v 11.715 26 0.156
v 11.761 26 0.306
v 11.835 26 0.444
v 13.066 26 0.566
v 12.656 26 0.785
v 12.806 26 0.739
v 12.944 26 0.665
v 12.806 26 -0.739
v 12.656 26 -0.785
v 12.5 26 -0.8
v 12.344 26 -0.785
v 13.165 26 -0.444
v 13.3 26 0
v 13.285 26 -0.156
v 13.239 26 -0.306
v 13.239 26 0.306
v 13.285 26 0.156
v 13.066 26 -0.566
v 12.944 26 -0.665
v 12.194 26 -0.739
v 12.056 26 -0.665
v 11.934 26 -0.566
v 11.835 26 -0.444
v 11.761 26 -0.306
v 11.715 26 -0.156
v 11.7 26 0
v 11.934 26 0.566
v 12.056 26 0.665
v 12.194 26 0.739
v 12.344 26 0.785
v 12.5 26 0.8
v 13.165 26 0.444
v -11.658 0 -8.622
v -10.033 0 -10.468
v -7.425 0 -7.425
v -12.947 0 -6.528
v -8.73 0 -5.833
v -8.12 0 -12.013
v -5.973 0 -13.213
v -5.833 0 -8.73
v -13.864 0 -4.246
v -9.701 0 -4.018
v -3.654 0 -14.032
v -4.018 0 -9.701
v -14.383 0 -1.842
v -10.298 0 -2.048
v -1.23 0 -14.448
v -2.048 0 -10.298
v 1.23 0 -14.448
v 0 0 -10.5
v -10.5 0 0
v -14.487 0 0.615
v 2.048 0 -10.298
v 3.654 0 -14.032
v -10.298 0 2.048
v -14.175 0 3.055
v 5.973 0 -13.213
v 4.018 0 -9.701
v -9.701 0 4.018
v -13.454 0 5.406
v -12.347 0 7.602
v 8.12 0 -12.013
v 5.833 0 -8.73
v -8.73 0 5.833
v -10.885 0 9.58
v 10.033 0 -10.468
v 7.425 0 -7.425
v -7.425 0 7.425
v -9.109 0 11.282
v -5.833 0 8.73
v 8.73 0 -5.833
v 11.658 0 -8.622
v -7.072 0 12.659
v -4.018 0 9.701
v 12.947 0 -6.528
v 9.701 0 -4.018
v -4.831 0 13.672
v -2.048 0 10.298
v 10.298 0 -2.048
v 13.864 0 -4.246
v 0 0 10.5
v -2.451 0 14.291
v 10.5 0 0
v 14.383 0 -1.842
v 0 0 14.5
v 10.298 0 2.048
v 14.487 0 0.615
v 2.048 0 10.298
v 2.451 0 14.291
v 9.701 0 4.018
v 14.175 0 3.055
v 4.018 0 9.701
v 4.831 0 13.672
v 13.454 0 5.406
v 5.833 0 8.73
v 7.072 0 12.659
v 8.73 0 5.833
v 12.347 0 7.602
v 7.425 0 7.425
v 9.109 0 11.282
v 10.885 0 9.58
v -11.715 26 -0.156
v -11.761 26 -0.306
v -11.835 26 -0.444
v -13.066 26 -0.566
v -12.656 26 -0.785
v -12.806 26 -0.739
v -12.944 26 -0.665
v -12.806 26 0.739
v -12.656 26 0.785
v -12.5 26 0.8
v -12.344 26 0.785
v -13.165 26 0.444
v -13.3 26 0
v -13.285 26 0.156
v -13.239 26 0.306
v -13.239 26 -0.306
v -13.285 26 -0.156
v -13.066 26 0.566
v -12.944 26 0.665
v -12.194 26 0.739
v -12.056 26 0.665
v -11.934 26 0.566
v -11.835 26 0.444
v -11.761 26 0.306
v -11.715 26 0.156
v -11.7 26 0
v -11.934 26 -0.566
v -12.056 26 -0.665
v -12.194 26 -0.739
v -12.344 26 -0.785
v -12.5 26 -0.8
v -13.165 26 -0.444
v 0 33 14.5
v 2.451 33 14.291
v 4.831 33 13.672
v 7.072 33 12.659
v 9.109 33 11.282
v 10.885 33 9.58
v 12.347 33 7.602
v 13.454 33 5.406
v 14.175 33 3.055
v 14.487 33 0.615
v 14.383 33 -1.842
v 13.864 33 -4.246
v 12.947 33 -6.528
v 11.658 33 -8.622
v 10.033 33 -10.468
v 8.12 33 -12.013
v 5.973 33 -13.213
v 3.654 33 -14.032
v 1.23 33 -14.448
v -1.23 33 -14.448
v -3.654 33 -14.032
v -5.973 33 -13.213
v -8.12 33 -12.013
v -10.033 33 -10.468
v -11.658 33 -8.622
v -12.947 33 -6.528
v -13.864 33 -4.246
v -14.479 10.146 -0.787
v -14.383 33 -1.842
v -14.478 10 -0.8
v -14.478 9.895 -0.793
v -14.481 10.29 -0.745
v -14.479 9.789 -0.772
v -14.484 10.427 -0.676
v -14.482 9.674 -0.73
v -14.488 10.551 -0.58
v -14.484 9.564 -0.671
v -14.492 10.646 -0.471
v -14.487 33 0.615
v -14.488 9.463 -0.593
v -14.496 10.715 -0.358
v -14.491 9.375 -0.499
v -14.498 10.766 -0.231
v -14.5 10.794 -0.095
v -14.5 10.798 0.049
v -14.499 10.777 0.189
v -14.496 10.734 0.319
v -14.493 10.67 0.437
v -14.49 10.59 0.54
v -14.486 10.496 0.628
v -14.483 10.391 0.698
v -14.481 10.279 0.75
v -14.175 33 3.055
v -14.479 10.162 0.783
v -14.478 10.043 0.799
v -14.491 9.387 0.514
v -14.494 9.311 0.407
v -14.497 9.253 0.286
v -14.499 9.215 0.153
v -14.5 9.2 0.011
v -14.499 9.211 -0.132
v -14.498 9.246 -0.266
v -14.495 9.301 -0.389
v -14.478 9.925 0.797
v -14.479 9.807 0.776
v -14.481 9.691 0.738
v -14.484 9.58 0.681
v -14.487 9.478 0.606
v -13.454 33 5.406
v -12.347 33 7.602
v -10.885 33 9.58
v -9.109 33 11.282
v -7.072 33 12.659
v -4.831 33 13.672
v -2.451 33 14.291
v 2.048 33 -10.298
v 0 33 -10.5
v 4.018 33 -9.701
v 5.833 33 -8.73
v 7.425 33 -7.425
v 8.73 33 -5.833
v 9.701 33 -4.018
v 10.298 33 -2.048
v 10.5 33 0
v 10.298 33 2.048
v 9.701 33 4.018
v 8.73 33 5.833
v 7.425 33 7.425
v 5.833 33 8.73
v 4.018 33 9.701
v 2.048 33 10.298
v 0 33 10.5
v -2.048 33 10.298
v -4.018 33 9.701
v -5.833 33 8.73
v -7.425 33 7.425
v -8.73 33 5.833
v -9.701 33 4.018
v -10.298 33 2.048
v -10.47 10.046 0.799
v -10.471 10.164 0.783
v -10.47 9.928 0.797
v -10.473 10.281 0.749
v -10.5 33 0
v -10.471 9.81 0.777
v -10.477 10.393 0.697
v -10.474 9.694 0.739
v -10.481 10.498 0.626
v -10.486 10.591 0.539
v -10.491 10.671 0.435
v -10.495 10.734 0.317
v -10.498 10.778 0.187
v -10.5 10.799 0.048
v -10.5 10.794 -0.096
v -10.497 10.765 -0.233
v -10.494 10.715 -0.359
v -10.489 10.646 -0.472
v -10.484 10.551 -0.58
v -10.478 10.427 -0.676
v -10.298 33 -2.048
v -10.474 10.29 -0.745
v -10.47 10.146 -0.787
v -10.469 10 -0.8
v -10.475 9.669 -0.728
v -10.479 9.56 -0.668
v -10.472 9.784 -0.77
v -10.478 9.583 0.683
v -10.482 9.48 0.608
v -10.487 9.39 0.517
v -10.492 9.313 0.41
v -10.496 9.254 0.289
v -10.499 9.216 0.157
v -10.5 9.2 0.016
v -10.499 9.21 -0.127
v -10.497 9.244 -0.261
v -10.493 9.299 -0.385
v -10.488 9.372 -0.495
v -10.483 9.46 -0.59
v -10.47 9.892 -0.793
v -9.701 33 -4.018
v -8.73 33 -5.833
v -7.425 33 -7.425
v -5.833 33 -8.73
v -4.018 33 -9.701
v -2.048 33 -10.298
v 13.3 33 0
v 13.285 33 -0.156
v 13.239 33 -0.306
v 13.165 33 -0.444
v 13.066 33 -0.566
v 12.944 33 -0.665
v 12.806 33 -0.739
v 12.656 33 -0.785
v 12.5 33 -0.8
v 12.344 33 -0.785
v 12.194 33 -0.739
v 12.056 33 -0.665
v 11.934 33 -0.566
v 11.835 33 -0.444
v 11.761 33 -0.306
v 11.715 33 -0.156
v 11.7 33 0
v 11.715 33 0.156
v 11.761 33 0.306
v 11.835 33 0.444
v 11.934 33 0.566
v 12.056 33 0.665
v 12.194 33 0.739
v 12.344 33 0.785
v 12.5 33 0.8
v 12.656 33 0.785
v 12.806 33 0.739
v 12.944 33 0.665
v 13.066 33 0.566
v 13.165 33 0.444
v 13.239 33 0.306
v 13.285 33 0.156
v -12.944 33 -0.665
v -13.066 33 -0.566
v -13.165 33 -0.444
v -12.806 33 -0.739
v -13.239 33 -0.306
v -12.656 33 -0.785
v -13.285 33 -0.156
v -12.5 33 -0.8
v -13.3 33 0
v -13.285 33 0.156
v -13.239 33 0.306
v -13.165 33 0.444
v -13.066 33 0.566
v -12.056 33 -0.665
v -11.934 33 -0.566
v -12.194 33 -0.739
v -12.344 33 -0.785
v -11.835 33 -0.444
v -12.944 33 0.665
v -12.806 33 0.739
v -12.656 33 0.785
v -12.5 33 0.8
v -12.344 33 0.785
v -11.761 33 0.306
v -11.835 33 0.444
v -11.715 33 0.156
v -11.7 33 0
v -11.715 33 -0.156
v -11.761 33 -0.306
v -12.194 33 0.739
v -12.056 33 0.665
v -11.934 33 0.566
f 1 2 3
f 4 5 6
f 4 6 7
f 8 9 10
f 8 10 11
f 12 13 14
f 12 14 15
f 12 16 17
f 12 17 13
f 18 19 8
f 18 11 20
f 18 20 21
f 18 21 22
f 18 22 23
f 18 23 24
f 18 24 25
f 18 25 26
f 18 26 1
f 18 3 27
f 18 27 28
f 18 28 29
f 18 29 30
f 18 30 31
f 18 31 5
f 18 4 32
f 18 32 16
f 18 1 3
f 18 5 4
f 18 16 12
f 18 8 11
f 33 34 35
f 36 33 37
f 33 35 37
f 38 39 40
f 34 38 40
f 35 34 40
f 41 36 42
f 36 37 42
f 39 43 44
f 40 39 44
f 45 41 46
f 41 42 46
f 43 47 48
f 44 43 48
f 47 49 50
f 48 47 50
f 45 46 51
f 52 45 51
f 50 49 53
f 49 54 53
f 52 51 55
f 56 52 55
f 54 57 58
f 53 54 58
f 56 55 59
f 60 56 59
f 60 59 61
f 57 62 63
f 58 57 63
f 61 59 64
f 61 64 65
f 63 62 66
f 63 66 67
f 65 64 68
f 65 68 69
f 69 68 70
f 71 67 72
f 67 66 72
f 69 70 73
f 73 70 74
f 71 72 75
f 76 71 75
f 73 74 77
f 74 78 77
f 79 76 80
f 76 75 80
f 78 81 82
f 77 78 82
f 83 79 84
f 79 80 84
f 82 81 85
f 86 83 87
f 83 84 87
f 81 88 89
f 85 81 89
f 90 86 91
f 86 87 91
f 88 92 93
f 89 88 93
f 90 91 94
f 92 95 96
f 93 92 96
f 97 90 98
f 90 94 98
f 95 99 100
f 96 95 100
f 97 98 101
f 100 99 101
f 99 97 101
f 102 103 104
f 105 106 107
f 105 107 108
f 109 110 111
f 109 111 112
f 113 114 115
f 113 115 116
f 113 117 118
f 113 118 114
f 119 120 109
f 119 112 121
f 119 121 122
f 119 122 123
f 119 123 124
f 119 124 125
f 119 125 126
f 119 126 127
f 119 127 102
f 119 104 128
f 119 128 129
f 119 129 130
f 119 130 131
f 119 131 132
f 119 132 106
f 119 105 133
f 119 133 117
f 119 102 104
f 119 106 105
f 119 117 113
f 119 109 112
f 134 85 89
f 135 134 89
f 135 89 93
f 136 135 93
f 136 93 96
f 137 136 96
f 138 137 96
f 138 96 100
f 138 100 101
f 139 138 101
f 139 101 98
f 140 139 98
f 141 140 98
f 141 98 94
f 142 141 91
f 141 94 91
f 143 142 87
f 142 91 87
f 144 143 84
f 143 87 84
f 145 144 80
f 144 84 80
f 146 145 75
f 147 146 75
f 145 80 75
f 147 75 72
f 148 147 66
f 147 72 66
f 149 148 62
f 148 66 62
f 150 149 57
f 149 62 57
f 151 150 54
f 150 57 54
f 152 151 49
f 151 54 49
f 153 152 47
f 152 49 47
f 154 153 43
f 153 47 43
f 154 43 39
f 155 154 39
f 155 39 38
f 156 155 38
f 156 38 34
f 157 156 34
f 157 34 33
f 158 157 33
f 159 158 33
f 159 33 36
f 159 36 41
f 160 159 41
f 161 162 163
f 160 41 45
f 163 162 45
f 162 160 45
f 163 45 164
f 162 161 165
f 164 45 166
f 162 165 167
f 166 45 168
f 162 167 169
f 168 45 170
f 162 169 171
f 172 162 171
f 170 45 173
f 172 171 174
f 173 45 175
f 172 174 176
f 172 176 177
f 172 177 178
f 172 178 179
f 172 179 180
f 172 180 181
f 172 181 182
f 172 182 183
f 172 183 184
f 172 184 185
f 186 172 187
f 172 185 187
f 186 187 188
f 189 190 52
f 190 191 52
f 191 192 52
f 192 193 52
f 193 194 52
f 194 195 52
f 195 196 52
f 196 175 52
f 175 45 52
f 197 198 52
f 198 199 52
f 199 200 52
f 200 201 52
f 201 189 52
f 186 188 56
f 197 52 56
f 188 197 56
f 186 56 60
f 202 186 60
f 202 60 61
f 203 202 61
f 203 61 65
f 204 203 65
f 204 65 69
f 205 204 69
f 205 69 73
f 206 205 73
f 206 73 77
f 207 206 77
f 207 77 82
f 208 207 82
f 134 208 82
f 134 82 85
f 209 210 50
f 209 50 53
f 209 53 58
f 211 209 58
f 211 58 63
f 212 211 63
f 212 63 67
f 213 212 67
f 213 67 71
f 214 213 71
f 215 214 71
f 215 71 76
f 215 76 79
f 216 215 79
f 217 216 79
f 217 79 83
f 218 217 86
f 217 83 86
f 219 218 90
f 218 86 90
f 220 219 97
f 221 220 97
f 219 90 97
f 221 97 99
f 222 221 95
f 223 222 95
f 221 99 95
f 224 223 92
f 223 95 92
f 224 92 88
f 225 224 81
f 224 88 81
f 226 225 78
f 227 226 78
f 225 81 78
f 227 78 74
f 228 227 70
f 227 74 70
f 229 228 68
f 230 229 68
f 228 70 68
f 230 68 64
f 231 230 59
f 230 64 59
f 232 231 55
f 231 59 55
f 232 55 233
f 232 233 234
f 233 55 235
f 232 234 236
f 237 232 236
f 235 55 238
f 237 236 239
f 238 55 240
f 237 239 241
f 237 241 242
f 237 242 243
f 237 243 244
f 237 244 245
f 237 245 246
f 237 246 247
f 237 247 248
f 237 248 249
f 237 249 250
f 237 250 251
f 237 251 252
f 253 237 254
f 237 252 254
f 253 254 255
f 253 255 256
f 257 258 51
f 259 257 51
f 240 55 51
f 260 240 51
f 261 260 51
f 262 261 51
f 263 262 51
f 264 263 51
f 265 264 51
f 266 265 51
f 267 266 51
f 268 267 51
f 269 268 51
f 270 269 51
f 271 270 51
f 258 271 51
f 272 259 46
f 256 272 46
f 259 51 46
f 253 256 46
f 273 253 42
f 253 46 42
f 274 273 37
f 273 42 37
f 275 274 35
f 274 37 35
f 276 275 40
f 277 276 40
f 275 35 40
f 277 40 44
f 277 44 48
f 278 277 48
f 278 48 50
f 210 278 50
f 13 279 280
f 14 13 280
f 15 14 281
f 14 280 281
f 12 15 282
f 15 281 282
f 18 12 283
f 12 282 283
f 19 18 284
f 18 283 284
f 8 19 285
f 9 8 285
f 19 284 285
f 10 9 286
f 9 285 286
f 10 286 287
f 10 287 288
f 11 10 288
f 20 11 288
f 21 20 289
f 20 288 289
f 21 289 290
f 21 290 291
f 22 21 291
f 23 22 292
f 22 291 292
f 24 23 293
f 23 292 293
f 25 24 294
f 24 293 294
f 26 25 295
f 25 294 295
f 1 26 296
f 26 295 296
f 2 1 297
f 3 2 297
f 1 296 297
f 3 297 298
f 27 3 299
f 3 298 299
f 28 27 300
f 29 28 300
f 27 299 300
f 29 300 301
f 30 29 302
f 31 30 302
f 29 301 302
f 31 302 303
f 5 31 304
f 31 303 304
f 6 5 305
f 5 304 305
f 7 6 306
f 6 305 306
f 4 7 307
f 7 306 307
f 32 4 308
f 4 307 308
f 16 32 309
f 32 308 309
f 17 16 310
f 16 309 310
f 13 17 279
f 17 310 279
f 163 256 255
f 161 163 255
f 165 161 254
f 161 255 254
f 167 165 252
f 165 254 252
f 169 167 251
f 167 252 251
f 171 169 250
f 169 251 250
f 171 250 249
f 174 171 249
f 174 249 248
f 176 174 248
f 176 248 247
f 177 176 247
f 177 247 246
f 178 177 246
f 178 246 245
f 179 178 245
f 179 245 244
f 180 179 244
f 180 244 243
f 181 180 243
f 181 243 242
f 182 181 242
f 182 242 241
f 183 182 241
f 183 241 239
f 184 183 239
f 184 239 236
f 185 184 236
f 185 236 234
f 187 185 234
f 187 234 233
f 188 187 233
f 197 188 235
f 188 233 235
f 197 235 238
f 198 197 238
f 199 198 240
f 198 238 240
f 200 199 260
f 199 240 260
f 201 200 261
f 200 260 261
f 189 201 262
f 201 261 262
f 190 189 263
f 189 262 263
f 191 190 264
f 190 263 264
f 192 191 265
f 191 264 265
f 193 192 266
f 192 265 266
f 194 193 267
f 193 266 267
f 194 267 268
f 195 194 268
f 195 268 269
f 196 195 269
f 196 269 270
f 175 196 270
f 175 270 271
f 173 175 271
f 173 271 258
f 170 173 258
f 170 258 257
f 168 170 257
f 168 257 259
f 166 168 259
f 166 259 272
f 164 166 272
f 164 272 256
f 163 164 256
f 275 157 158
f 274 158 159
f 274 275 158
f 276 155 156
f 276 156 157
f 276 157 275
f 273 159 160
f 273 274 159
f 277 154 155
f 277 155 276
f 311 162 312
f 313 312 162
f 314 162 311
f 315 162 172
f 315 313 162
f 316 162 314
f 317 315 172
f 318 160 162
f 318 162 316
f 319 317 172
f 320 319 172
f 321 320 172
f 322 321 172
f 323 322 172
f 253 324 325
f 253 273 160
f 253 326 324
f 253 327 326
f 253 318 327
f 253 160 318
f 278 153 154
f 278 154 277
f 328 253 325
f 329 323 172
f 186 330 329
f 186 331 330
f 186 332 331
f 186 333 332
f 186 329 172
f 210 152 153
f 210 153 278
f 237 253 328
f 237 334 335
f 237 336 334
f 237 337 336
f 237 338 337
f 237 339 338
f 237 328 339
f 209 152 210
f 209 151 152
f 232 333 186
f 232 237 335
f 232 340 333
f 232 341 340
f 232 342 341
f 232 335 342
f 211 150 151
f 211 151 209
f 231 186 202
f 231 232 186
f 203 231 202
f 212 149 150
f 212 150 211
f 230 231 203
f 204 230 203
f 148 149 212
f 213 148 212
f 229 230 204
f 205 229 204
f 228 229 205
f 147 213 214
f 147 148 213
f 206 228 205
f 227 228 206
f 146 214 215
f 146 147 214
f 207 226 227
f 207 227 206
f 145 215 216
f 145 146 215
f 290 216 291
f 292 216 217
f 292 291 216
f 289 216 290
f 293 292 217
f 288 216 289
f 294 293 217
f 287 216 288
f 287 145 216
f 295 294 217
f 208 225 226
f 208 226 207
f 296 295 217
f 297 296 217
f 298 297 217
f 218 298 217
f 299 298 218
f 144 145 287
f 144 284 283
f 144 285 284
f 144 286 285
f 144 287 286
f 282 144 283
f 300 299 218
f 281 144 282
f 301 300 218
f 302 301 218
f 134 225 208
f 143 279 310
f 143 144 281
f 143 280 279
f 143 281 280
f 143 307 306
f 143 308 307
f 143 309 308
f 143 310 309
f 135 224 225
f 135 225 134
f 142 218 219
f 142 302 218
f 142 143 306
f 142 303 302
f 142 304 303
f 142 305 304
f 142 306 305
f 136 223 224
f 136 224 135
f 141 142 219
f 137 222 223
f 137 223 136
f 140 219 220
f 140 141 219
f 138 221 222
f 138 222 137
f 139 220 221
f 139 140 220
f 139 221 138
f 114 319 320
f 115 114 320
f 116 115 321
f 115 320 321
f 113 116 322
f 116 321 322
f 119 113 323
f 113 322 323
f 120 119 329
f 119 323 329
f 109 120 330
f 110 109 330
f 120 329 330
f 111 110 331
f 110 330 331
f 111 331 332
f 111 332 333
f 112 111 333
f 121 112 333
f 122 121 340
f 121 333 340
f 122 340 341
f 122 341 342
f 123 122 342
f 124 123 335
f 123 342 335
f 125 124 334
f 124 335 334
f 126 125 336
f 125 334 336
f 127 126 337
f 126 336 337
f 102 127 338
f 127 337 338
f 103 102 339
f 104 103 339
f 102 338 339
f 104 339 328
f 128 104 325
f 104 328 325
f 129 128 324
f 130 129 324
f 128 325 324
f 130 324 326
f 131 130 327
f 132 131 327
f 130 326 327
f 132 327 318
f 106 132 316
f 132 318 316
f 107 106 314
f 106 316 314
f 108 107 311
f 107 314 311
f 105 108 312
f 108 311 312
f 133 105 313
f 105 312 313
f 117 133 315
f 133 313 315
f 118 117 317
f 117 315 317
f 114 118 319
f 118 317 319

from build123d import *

# Parameters (mm, degrees)
SKETCH_1_R          = 13
SKETCH_1_R_2        = 9.172
EXTRUDE_1_DEPTH     = 25
SKETCH_7_R          = 10.172
CUT_EXTRUDE_2_DEPTH = 50
SKETCH_8_R          = 13
SKETCH_8_R_2        = 10.172
EXTRUDE_2_DEPTH     = 8
SKETCH_11_R         = 10.5
CUT_EXTRUDE_4_DEPTH = 50
EXTRUDE_START       = -33
SKETCH_13_R         = 14.5
SKETCH_13_R_2       = 13
EXTRUDE_3_DEPTH     = 33
SKETCH_4_R          = 0.8
CUT_EXTRUDE_1_DEPTH = 30
SKETCH_10_R         = 0.8
CUT_EXTRUDE_5_DEPTH = 7


with BuildPart() as part:
    # Эскиз1 → Бобышка-Вытянуть1 (new body)
    with BuildSketch(Plane(origin=(0, 0, 0), x_dir=(1, 0, 0), z_dir=(0, 1, 0))):
        with Locations(Location((0, 0, 0), (0, 0, 270))):
            Circle(SKETCH_1_R)
        with Locations(Location((0, 0, 0), (0, 0, 270))):
            Circle(SKETCH_1_R_2, mode=Mode.SUBTRACT)
    extrude(amount=EXTRUDE_1_DEPTH)

    # Эскиз7 → Вырез-Вытянуть2 (cut)
    with BuildSketch(Plane.XZ):
        with Locations(Location((0, 0, 0), (0, 0, 270))):
            Circle(SKETCH_7_R)
    extrude(amount=-CUT_EXTRUDE_2_DEPTH, mode=Mode.SUBTRACT)

    # Эскиз8 → Бобышка-Вытянуть2 (add)
    with BuildSketch(Plane(origin=(0, 25, 0), x_dir=(1, 0, 0), z_dir=(0, 1, 0))):
        with Locations(Location((0, 0, 0), (0, 0, 270))):
            Circle(SKETCH_8_R)
        with Locations(Location((0, 0, 0), (0, 0, 90))):
            Circle(SKETCH_8_R_2, mode=Mode.SUBTRACT)
    extrude(amount=EXTRUDE_2_DEPTH)

    # Эскиз11 → Вырез-Вытянуть4 (cut)
    with BuildSketch(Plane.XZ):
        with Locations(Location((0, 0, 0), (0, 0, 270))):
            Circle(SKETCH_11_R)
    extrude(amount=-CUT_EXTRUDE_4_DEPTH, mode=Mode.SUBTRACT)

    # Эскиз13 → Бобышка-Вытянуть3 (add)
    with BuildSketch(Plane(origin=(0, 33, 0), x_dir=(1, 0, 0), z_dir=(0, 1, 0)).offset(EXTRUDE_START)):
        with Locations(Location((0, 0, 0), (0, 0, 270))):
            Circle(SKETCH_13_R)
        Circle(SKETCH_13_R_2, mode=Mode.SUBTRACT)
    extrude(amount=EXTRUDE_3_DEPTH)

    # Эскиз4 → Вырез-Вытянуть1 (cut)
    with BuildSketch(Plane(origin=(0, 0, 0), x_dir=(0, 0, -1), z_dir=(1, 0, 0))):
        with Locations((0, 10)):
            Circle(SKETCH_4_R)
    extrude(amount=-CUT_EXTRUDE_1_DEPTH, mode=Mode.SUBTRACT)

    # Эскиз10 → Вырез-Вытянуть5 (cut)
    with BuildSketch(Plane(origin=(0, 33, 0), x_dir=(1, 0, 0), z_dir=(0, 1, 0))):
        with Locations(Location((-12.5, 0, 0), (0, 0, 180))):
            Circle(SKETCH_10_R)
        with Locations((12.5, 0)):
            Circle(SKETCH_10_R)
    extrude(amount=-CUT_EXTRUDE_5_DEPTH, mode=Mode.SUBTRACT)


solid = part.part
